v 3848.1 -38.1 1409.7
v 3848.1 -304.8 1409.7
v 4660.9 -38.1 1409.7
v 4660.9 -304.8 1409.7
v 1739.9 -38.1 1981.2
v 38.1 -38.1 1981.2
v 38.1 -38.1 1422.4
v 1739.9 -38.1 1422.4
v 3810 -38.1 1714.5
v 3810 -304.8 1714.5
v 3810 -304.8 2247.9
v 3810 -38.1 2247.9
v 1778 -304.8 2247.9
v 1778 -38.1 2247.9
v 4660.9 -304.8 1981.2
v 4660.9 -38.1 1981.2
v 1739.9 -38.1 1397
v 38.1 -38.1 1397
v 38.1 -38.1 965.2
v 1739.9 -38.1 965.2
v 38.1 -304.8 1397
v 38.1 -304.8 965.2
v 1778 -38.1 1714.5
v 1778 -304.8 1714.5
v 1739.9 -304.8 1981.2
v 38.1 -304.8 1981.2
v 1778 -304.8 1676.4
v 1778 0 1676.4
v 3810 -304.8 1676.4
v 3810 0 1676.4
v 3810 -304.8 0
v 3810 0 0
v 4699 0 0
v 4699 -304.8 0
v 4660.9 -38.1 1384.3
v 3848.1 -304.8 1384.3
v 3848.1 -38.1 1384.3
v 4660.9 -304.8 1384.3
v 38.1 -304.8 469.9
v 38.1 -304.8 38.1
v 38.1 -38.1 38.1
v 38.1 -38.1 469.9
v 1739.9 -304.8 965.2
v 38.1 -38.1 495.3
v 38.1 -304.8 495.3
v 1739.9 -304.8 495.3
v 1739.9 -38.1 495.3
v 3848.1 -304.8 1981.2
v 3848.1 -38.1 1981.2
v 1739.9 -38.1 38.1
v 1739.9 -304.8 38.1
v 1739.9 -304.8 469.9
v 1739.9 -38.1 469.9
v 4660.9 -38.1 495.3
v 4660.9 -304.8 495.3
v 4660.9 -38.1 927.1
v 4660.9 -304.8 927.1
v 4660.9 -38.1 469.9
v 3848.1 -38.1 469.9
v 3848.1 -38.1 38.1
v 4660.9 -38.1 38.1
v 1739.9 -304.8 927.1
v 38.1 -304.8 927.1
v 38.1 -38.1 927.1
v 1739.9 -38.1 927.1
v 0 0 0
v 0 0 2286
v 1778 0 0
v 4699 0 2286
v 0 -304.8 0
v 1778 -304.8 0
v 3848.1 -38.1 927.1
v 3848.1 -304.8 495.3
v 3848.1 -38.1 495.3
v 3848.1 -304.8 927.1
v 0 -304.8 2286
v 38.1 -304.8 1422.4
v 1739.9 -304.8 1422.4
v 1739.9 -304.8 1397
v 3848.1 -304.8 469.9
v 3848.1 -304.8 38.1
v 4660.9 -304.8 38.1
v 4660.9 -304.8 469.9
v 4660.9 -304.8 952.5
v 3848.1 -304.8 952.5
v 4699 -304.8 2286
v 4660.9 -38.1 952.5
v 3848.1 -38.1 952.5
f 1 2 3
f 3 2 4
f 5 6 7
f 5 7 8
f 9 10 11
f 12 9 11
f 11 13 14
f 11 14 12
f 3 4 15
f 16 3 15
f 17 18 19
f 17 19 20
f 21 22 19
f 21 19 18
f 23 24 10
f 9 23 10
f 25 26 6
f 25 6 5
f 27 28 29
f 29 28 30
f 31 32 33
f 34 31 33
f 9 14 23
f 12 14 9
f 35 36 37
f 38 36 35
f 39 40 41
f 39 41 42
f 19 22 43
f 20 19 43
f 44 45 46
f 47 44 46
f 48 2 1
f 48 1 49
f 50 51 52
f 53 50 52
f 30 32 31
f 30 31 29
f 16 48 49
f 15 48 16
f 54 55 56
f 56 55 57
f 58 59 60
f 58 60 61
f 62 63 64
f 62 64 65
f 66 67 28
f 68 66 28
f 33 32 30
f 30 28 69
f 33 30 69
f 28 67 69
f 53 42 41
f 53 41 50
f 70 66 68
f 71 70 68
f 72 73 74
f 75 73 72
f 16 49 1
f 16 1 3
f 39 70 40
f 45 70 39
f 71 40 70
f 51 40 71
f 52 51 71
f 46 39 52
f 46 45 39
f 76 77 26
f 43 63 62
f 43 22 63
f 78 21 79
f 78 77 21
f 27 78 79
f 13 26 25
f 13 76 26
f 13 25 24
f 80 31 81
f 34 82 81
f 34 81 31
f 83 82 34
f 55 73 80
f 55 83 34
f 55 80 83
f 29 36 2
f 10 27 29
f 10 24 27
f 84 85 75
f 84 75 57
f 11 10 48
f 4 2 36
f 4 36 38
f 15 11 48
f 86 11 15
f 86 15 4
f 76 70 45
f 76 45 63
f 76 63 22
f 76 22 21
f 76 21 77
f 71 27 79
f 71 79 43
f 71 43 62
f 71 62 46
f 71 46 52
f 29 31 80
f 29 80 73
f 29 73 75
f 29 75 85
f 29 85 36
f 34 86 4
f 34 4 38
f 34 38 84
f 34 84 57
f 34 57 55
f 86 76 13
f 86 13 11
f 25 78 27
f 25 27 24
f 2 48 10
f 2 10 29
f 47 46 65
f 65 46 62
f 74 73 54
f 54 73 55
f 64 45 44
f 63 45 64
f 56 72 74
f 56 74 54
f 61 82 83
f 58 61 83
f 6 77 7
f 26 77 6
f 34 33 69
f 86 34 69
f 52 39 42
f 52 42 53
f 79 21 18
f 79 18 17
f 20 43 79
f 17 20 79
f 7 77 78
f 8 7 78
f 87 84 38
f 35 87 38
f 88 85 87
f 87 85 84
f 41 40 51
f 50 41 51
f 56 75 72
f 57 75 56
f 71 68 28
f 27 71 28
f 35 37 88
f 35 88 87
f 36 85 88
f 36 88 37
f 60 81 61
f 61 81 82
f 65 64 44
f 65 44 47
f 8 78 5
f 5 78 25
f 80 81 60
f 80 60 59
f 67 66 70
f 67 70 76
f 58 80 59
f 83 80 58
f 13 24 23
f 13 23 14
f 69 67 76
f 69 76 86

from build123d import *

# Parameters (mm, degrees)
F0_W      = 4699
F0_H      = 2286
F1_DEPTH  = 304.8
F2_W      = 2032
F2_H      = 1676.4
F3_DEPTH  = 304.8
F4_W      = 812.8
F4_H      = 431.8
F5_DEPTH  = 266.7
F6_W      = 812.8
F6_H      = 431.8
F7_DEPTH  = 266.7
F8_W      = 1701.8
F8_H      = 431.8
F9_DEPTH  = 266.7
F10_W     = 812.8
F10_H     = 431.8
F11_DEPTH = 266.7
F12_W     = 1701.8
F12_H     = 431.8
F13_DEPTH = 266.7
F14_W     = 1701.8
F14_H     = 431.8
F15_DEPTH = 266.7
F16_W     = 812.8
F16_H     = 571.5
F17_DEPTH = 266.7
F18_W     = 2032
F18_H     = 533.4
F19_DEPTH = 266.7
F20_W     = 1701.8
F20_H     = 558.8
F21_DEPTH = 266.7


with BuildPart() as f1:
    # F0 (on Front) → F1 (new body)
    with BuildSketch(Plane.XZ):
        with Locations((2349.5, 1143)):
            Rectangle(F0_W, F0_H)
    extrude(amount=F1_DEPTH)

    # F2 (on Front) → F3 (cut)
    with BuildSketch(Plane.XZ):
        with Locations((2794, 838.2)):
            Rectangle(F2_W, F2_H)
    extrude(amount=F3_DEPTH, mode=Mode.SUBTRACT)

    # F4 (on face) → F5 (cut)
    with BuildSketch(Plane.XZ.offset(304.8)):
        with Locations((4254.5, 254)):
            Rectangle(F4_W, F4_H)
    extrude(amount=-F5_DEPTH, mode=Mode.SUBTRACT)

    # F6 (on face) → F7 (cut)
    with BuildSketch(Plane.XZ.offset(304.8)):
        with Locations((4254.5, 711.2)):
            Rectangle(F6_W, F6_H)
    extrude(amount=-F7_DEPTH, mode=Mode.SUBTRACT)

    # F8 (on face) → F9 (cut)
    with BuildSketch(Plane.XZ.offset(304.8)):
        with Locations((889, 254)):
            Rectangle(F8_W, F8_H)
    extrude(amount=-F9_DEPTH, mode=Mode.SUBTRACT)

    # F10 (on face) → F11 (cut)
    with BuildSketch(Plane.XZ.offset(304.8)):
        with Locations((4254.5, 1168.4)):
            Rectangle(F10_W, F10_H)
    extrude(amount=-F11_DEPTH, mode=Mode.SUBTRACT)

    # F12 (on face) → F13 (cut)
    with BuildSketch(Plane.XZ.offset(304.8)):
        with Locations((889, 711.2)):
            Rectangle(F12_W, F12_H)
    extrude(amount=-F13_DEPTH, mode=Mode.SUBTRACT)

    # F14 (on face) → F15 (cut)
    with BuildSketch(Plane.XZ.offset(304.8)):
        with Locations((889, 1181.1)):
            Rectangle(F14_W, F14_H)
    extrude(amount=-F15_DEPTH, mode=Mode.SUBTRACT)

    # F16 (on face) → F17 (cut)
    with BuildSketch(Plane.XZ.offset(304.8)):
        with Locations((4254.5, 1695.45)):
            Rectangle(F16_W, F16_H)
    extrude(amount=-F17_DEPTH, mode=Mode.SUBTRACT)

    # F18 (on face) → F19 (cut)
    with BuildSketch(Plane.XZ.offset(304.8)):
        with Locations((2794, 1981.2)):
            Rectangle(F18_W, F18_H)
    extrude(amount=-F19_DEPTH, mode=Mode.SUBTRACT)

    # F20 (on face) → F21 (cut)
    with BuildSketch(Plane.XZ.offset(304.8)):
        with Locations((889, 1701.8)):
            Rectangle(F20_W, F20_H)
    extrude(amount=-F21_DEPTH, mode=Mode.SUBTRACT)


solid = f1.part
